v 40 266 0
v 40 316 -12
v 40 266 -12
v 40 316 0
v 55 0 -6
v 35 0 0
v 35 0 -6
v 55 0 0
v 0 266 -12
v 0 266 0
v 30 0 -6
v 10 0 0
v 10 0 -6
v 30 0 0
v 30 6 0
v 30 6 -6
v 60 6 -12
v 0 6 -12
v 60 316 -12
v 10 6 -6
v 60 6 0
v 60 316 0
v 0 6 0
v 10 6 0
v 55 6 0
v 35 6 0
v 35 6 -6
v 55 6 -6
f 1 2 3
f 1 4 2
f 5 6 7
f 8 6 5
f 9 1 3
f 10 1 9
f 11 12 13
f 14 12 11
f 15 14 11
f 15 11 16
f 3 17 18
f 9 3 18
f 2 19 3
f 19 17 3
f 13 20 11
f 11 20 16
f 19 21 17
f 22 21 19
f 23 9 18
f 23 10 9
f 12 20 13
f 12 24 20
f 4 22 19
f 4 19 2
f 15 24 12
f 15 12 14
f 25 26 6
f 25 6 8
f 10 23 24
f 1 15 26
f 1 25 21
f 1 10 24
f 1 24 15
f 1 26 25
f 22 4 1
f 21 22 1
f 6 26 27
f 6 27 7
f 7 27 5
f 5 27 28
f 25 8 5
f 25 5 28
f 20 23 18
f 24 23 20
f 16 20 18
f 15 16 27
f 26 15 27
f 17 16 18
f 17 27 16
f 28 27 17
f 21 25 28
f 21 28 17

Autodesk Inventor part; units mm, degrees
ref_plane "YZ Plane" through (0, 0, 0) normal (1, 0, 0) x (0, 1, 0)
ref_plane "XZ Plane" through (0, 0, 0) normal (0, 1, 0) x (-1, 0, 0)
ref_plane "XY Plane" through (0, 0, 0) normal (0, 0, 1) x (1, 0, 0)
sketch "Sketch1" plane through (0, 0, 0) normal (0, 0, 1) x (1, 0, 0)
  line L0 (0, 266) -> (0, 6)
  line L1 (60, 6) -> (60, 316)
  line L2 (0, 6) -> (10, 6)
  line L3 (10, 6) -> (10, 0)
  line L4 (10, 0) -> (30, 0)
  line L5 (30, 0) -> (30, 6)
  line L6 (30, 6) -> (35, 6)
  line L7 (35, 6) -> (35, 0)
  line L8 (35, 0) -> (55, 0)
  line L9 (55, 0) -> (55, 6)
  line L10 (55, 6) -> (60, 6)
  line L11 (60, 316) -> (40, 316)
  line L12 (40, 316) -> (40, 266)
  line L13 (40, 266) -> (0, 266)
  point P0 (0, 0)
  dimension "d25" = 10
  dimension "d26" = 20
  dimension "d27" = 5
  dimension "d29" = 20
  dimension "d31" = 310
  dimension "d32" = 20
  dimension "d33" = 50
  dimension "d34" = 6
extrude "Extrusion1" add sketch "Sketch1" against normal blind 6
sketch "Sketch3" plane through (0, 0, -6) normal (0, 0, -1) x (-1, 0, 0)
  line L0 (-60, 316) -> (-60, 6) projected
  line L1 (-60, 316) -> (-60, 6)
  line L2 (-60, 6) -> (0, 6)
  line L3 (-40, 316) -> (-60, 316)
  line L4 (0, 6) -> (0, 266) projected
  line L5 (0, 6) -> (0, 266)
  line L6 (0, 266) -> (-40, 266)
  line L7 (-40, 266) -> (-40, 316) projected
  line L8 (-40, 266) -> (-40, 316)
  point P0 (0, 0)
extrude "Extrusion3" add sketch "Sketch3" along normal blind 6
properties part number "Archimedes Screw Border3"
